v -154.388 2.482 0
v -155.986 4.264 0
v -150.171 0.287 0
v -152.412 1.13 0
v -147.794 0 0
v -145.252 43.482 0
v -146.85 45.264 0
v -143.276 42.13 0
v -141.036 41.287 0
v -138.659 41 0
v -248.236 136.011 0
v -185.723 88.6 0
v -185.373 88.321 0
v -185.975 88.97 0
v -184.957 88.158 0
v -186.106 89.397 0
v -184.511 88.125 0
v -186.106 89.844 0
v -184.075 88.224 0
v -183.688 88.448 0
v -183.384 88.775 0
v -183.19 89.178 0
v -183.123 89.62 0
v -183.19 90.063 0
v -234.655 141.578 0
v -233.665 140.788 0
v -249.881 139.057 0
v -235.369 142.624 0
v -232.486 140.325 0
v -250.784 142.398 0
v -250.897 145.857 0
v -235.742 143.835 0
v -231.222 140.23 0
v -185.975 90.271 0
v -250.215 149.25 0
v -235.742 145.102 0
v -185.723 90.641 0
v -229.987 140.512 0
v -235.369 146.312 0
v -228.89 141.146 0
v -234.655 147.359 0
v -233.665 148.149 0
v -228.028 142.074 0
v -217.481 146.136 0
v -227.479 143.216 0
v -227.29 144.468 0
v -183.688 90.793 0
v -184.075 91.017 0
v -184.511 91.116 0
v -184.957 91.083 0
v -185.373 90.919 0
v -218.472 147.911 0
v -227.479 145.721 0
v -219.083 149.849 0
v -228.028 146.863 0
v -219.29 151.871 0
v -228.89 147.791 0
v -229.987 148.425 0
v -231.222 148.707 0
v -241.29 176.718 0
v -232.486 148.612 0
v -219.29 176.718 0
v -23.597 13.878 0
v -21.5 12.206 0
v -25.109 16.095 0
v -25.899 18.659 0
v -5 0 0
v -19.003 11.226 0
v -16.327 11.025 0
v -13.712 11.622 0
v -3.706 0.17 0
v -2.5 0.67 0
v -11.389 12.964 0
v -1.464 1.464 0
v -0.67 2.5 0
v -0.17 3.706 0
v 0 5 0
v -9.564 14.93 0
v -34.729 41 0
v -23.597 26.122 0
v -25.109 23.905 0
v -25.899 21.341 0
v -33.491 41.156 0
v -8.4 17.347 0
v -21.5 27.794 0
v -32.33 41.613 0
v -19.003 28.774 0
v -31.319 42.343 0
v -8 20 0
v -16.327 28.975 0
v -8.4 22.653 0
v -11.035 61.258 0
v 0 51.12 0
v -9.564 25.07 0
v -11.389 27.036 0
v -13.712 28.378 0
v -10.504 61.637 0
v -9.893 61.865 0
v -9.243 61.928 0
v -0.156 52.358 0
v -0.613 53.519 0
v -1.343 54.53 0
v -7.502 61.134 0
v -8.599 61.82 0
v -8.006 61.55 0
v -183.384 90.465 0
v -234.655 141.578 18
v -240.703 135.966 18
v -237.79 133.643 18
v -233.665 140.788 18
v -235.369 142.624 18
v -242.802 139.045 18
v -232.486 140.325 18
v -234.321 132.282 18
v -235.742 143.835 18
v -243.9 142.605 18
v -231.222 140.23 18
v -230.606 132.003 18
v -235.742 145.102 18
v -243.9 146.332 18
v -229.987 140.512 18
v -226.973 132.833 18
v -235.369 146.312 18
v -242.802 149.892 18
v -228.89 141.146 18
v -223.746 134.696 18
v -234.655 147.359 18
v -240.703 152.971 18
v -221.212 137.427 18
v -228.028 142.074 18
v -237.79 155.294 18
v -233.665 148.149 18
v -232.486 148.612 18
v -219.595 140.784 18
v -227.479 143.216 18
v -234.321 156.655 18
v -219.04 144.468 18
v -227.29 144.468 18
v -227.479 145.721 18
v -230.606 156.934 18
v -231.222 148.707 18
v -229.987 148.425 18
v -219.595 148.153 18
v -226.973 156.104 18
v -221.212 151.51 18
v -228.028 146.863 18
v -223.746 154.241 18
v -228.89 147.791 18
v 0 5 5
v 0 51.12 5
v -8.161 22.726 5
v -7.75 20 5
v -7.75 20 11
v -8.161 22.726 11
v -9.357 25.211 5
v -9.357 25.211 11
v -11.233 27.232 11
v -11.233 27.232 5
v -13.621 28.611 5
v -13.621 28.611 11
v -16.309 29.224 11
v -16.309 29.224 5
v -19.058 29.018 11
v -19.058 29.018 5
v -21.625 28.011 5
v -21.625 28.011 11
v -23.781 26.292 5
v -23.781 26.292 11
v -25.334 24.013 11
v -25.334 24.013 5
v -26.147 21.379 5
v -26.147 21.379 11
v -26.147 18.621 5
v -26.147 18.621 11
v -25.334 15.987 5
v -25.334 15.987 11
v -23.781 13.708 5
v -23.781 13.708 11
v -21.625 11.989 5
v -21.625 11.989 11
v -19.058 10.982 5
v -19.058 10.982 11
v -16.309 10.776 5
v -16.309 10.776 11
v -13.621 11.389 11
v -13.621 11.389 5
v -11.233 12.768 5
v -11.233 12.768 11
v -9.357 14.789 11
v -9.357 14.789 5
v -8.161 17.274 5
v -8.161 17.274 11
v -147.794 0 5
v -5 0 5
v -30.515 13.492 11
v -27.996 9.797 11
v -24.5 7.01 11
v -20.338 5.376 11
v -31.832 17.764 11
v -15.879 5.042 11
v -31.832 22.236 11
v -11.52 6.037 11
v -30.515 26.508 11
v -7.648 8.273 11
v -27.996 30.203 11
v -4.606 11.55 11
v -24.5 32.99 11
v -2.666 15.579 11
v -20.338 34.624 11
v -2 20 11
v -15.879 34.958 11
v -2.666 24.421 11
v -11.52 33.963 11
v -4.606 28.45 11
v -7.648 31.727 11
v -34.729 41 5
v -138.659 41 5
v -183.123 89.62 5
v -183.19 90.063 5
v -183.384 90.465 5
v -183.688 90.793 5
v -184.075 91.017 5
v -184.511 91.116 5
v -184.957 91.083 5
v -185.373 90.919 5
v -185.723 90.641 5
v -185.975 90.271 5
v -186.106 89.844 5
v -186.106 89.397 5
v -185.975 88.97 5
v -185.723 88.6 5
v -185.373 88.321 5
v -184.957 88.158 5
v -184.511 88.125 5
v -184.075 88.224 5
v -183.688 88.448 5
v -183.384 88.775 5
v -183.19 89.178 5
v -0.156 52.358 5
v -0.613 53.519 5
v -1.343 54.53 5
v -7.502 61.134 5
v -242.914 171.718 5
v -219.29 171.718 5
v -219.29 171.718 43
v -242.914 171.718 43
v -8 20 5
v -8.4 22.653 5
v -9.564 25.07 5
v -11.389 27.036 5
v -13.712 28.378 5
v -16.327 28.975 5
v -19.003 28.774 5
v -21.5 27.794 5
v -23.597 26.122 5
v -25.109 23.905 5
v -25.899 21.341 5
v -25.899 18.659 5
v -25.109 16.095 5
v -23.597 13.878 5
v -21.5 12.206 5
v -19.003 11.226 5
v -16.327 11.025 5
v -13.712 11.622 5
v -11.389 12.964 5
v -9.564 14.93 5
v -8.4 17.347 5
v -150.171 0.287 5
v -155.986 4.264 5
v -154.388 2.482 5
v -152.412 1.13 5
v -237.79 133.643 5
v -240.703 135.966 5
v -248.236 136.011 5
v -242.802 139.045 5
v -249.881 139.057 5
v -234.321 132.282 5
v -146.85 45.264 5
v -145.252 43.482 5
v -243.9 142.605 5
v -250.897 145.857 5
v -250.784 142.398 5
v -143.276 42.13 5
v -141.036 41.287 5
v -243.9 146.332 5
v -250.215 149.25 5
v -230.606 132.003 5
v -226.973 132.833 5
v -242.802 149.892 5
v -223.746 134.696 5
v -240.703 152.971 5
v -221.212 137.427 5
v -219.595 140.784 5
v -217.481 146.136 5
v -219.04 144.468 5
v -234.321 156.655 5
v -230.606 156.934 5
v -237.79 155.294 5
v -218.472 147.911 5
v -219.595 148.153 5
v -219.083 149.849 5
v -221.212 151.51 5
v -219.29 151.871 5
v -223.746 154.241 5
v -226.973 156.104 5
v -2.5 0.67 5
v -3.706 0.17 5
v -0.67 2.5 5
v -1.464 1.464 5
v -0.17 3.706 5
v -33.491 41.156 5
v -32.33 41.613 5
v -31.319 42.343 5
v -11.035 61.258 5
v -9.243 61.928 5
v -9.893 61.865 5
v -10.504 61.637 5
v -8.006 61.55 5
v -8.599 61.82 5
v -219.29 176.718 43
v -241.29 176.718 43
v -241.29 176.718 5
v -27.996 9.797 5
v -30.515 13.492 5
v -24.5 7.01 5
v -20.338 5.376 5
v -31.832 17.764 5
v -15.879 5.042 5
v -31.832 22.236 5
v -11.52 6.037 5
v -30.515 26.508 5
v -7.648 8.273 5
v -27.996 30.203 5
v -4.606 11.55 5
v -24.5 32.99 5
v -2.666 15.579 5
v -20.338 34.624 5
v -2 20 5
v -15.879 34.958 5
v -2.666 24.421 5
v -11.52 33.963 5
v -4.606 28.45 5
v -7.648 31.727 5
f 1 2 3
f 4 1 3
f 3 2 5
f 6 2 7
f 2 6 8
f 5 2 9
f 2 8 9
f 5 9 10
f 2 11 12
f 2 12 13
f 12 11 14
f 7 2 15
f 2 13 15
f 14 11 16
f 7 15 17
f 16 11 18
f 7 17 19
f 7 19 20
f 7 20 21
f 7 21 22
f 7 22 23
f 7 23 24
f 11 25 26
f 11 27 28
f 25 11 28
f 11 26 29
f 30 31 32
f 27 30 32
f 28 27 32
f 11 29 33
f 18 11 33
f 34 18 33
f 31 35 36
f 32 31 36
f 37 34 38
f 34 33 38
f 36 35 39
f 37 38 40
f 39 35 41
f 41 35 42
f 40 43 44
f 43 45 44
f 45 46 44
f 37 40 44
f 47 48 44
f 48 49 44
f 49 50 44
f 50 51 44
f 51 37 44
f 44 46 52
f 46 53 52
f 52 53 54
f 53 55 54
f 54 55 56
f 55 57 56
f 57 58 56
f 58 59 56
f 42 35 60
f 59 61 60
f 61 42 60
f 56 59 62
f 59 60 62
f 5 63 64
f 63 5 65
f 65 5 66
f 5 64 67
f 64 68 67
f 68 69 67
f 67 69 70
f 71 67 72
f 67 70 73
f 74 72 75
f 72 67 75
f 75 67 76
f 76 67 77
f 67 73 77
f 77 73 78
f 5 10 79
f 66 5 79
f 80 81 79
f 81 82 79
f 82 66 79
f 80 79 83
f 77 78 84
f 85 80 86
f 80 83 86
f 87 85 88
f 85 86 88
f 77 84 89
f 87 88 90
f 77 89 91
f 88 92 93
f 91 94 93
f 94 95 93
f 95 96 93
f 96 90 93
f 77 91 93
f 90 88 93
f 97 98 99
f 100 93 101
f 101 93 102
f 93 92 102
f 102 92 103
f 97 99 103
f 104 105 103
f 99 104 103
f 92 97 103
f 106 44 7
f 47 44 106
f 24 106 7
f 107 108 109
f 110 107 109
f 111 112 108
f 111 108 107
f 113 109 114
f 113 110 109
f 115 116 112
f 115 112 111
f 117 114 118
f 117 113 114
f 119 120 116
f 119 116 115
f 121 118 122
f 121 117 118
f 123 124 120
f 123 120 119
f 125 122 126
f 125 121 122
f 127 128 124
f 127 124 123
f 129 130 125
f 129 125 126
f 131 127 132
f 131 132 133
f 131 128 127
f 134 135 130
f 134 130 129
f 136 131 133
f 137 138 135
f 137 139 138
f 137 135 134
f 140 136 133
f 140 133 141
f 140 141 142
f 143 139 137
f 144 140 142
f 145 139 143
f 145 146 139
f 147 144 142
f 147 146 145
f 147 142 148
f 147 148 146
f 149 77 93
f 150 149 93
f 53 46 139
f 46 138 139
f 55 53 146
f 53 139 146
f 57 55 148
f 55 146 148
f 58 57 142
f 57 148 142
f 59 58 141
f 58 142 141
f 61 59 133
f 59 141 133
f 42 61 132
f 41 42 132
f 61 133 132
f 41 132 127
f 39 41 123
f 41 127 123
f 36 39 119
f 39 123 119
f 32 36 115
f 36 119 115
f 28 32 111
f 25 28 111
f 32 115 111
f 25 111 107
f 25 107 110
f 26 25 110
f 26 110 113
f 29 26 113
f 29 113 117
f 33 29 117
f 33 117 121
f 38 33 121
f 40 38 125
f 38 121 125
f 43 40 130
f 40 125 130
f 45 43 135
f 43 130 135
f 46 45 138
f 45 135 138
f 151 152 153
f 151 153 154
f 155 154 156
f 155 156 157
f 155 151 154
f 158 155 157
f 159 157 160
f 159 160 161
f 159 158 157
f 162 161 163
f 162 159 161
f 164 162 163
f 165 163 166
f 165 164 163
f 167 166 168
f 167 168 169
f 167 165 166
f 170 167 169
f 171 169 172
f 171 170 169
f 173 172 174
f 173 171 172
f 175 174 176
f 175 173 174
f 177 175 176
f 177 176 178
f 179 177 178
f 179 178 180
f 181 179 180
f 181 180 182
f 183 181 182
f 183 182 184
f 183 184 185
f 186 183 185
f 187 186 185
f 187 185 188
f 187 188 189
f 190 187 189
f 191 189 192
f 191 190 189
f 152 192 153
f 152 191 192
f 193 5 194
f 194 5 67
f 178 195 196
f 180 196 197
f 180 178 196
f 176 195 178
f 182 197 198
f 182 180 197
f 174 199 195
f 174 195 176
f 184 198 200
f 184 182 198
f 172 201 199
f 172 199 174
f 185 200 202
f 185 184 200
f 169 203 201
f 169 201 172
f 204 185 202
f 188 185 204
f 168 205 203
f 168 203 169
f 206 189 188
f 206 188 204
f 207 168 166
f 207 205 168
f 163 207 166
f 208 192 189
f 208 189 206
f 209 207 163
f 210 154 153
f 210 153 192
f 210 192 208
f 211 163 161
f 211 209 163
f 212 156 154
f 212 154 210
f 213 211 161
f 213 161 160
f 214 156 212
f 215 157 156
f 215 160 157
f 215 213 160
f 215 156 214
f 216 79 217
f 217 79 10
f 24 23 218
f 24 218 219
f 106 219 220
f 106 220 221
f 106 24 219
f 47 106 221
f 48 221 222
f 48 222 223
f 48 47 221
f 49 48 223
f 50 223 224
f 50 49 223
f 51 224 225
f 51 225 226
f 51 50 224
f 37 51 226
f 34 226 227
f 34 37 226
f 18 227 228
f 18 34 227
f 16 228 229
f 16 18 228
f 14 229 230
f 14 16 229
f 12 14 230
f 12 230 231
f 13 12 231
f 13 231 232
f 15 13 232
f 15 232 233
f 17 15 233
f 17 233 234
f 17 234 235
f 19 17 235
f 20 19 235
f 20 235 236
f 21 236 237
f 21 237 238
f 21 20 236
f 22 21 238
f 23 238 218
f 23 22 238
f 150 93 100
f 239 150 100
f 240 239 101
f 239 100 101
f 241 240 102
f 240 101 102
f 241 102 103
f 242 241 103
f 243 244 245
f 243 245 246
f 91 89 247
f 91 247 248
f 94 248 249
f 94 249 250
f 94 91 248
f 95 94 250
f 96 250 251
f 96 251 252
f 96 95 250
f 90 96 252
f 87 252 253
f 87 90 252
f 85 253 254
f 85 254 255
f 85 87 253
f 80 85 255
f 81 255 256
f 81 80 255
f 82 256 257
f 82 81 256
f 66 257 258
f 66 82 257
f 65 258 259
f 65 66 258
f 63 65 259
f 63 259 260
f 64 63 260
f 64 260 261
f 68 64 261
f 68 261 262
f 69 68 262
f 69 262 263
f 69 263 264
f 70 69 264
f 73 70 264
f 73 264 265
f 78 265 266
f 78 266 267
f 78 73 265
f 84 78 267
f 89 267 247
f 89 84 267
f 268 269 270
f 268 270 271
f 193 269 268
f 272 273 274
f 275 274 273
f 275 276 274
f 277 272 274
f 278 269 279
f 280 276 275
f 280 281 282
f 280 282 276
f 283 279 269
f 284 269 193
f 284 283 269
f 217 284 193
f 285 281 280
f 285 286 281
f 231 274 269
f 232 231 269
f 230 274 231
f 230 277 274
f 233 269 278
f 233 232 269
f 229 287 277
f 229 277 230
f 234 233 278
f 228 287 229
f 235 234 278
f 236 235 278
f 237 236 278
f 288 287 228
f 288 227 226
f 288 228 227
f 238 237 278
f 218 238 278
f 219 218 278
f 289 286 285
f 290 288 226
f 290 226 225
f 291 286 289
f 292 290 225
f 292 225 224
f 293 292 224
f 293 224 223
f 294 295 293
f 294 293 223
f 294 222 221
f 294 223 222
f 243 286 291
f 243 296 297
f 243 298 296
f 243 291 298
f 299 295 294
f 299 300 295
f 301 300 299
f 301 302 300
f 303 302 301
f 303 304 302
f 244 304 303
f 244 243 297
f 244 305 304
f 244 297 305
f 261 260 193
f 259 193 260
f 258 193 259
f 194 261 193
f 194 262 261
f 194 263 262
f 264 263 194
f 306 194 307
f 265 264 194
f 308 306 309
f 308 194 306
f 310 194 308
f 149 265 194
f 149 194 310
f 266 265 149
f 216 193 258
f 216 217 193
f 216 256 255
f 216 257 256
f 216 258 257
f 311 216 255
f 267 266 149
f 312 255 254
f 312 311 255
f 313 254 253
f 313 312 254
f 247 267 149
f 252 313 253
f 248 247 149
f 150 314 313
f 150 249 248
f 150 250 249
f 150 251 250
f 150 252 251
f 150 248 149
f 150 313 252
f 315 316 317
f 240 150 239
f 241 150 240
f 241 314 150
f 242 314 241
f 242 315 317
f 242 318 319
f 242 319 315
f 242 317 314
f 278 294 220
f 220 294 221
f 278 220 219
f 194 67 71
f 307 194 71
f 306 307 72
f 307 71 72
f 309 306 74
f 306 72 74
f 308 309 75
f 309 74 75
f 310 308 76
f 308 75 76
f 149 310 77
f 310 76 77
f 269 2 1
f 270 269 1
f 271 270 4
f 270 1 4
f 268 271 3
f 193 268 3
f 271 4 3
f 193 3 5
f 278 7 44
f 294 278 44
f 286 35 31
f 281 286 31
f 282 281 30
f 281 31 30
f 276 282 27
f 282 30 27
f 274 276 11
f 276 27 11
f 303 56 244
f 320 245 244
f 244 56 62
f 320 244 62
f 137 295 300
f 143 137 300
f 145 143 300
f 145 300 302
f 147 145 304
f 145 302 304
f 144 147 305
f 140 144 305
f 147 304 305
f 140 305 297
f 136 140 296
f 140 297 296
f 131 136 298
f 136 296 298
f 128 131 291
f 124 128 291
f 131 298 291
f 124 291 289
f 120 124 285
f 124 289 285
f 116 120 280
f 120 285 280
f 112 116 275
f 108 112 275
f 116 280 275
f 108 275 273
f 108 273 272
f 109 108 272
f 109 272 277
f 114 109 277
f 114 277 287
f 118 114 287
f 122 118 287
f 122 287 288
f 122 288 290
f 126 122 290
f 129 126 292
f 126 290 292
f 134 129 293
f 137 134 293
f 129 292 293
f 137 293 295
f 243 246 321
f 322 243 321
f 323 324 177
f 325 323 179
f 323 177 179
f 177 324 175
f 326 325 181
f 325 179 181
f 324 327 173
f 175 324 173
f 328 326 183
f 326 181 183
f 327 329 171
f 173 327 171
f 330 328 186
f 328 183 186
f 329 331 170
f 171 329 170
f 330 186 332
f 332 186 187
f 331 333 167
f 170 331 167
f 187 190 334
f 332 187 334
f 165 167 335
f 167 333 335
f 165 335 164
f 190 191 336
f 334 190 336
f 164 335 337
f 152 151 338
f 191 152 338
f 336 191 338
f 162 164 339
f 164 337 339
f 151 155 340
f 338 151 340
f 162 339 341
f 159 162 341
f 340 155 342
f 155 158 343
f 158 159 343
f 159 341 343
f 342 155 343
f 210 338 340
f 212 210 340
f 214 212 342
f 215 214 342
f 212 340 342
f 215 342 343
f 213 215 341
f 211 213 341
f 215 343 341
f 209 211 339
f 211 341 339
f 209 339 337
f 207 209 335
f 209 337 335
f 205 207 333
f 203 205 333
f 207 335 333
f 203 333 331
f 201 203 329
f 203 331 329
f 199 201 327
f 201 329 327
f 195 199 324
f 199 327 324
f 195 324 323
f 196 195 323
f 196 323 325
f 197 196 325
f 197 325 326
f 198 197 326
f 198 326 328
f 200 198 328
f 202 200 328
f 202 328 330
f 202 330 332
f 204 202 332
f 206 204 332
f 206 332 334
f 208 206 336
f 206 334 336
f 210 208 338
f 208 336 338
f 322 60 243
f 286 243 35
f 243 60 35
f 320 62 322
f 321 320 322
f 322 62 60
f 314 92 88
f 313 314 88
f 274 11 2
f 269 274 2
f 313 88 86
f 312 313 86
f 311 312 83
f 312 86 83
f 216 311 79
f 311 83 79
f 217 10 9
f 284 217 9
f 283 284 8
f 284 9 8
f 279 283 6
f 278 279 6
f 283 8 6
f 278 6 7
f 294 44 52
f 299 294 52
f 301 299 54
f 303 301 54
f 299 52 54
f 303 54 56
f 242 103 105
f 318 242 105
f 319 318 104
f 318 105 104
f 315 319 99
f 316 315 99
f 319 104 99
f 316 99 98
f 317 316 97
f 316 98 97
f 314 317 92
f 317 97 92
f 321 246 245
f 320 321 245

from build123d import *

# Parameters (mm, degrees)
F0_R          = 9
F0_R_2        = 1.5
F1_DEPTH      = 5
F3_DEPTH      = 43
F5_START      = 5
F4_R          = 12.5
F5_DEPTH      = 13
F6_R          = 4.25
F7_DEPTH      = 38.001
F7_DEPTH_BACK = 5.001
F8_R          = 15
F8_R_2        = 9.25
F9_DEPTH      = 6


with BuildPart() as f1:
    # F0 (on Top) → F1 (new body)
    with BuildSketch(Plane.XY):
        with BuildLine():
            Line((-147.7943294945, 0), (-5, 0))
            ThreePointArc((-5, 0), (-1.4644660941, 1.4644660941), (0, 5))
            Line((0, 5), (0, 51.1199510489))
            ThreePointArc((0, 51.1199510489), (-0.3479121601, 52.9524571825), (-1.3432314919, 54.5299428492))
            Line((-1.3432314919, 54.5299428492), (-7.5019819607, 61.1343941448))
            ThreePointArc((-7.5019819607, 61.1343941448), (-9.243117473, 61.9278753122), (-11.0353621149, 61.2577824987))
            Line((-11.0353621149, 61.2577824987), (-31.3187347787, 42.3432314919))
            ThreePointArc((-31.3187347787, 42.3432314919), (-32.8962204454, 41.3479121601), (-34.728726579, 41))
            Line((-34.728726579, 41), (-138.6588263095, 41))
            ThreePointArc((-138.6588263095, 41), (-143.2763124418, 42.1298916682), (-146.8503467524, 45.2642356365))
            Line((-146.8503467524, 45.2642356365), (-217.481318638, 146.1357173493))
            ThreePointArc((-217.481318638, 146.1357173493), (-218.8269677026, 148.8644237177), (-219.2897981952, 151.8714817128))
            Line((-219.2897981952, 151.8714817128), (-219.2897981952, 176.718493824))
            Line((-219.2897981952, 176.718493824), (-241.2897981952, 176.718493824))
            Line((-241.2897981952, 176.718493824), (-250.214761167, 149.2502822158))
            ThreePointArc((-250.214761167, 149.2502822158), (-250.784151373, 142.3978861332), (-248.2361940869, 136.0113807549))
            Line((-248.2361940869, 136.0113807549), (-155.9858499374, 4.2642356365))
            ThreePointArc((-155.9858499374, 4.2642356365), (-152.4118156268, 1.1298916682), (-147.7943294945, 0))
        make_face()
        with Locations((-17, 20)):
            Circle(F0_R, mode=Mode.SUBTRACT)
        with Locations((-184.6231163043, 89.6203838053)):
            Circle(F0_R_2, mode=Mode.SUBTRACT)
    extrude(amount=F1_DEPTH)

    # F2 (on face) → F3 (join)
    with BuildSketch(Plane(origin=(0, 0, 0), x_dir=(1, 0, 0), z_dir=(0, 0, -1))):
        Polygon((-242.9143966763, -171.718493824), (-241.2897981952, -176.718493824), (-219.2897981952, -176.718493824), (-219.2897981952, -171.718493824), align=None)
    extrude(amount=-F3_DEPTH)

    # F4 (on face) → F5 (join)
    with BuildSketch(Plane.XY.offset(F5_START)):
        with Locations((-231.5397981952, 144.468493824)):
            Circle(F4_R)
    extrude(amount=F5_DEPTH)

    # F6 (on face) → F7 (cut, two sides)
    with BuildSketch(Plane.XY.offset(5)) as f7_sk:
        with Locations((-231.5397981952, 144.468493824)):
            Circle(F6_R)
    extrude(amount=F7_DEPTH, mode=Mode.SUBTRACT)
    extrude(f7_sk.sketch, amount=-F7_DEPTH_BACK, mode=Mode.SUBTRACT)


with BuildPart() as f9:
    # F8 (on face) → F9 (new body)
    with BuildSketch(Plane.XY.offset(5)):
        with Locations((-17, 20)):
            Circle(F8_R)
        with Locations((-17, 20)):
            Circle(F8_R_2, mode=Mode.SUBTRACT)
    extrude(amount=F9_DEPTH)


solid = Compound([f1.part, f9.part])
